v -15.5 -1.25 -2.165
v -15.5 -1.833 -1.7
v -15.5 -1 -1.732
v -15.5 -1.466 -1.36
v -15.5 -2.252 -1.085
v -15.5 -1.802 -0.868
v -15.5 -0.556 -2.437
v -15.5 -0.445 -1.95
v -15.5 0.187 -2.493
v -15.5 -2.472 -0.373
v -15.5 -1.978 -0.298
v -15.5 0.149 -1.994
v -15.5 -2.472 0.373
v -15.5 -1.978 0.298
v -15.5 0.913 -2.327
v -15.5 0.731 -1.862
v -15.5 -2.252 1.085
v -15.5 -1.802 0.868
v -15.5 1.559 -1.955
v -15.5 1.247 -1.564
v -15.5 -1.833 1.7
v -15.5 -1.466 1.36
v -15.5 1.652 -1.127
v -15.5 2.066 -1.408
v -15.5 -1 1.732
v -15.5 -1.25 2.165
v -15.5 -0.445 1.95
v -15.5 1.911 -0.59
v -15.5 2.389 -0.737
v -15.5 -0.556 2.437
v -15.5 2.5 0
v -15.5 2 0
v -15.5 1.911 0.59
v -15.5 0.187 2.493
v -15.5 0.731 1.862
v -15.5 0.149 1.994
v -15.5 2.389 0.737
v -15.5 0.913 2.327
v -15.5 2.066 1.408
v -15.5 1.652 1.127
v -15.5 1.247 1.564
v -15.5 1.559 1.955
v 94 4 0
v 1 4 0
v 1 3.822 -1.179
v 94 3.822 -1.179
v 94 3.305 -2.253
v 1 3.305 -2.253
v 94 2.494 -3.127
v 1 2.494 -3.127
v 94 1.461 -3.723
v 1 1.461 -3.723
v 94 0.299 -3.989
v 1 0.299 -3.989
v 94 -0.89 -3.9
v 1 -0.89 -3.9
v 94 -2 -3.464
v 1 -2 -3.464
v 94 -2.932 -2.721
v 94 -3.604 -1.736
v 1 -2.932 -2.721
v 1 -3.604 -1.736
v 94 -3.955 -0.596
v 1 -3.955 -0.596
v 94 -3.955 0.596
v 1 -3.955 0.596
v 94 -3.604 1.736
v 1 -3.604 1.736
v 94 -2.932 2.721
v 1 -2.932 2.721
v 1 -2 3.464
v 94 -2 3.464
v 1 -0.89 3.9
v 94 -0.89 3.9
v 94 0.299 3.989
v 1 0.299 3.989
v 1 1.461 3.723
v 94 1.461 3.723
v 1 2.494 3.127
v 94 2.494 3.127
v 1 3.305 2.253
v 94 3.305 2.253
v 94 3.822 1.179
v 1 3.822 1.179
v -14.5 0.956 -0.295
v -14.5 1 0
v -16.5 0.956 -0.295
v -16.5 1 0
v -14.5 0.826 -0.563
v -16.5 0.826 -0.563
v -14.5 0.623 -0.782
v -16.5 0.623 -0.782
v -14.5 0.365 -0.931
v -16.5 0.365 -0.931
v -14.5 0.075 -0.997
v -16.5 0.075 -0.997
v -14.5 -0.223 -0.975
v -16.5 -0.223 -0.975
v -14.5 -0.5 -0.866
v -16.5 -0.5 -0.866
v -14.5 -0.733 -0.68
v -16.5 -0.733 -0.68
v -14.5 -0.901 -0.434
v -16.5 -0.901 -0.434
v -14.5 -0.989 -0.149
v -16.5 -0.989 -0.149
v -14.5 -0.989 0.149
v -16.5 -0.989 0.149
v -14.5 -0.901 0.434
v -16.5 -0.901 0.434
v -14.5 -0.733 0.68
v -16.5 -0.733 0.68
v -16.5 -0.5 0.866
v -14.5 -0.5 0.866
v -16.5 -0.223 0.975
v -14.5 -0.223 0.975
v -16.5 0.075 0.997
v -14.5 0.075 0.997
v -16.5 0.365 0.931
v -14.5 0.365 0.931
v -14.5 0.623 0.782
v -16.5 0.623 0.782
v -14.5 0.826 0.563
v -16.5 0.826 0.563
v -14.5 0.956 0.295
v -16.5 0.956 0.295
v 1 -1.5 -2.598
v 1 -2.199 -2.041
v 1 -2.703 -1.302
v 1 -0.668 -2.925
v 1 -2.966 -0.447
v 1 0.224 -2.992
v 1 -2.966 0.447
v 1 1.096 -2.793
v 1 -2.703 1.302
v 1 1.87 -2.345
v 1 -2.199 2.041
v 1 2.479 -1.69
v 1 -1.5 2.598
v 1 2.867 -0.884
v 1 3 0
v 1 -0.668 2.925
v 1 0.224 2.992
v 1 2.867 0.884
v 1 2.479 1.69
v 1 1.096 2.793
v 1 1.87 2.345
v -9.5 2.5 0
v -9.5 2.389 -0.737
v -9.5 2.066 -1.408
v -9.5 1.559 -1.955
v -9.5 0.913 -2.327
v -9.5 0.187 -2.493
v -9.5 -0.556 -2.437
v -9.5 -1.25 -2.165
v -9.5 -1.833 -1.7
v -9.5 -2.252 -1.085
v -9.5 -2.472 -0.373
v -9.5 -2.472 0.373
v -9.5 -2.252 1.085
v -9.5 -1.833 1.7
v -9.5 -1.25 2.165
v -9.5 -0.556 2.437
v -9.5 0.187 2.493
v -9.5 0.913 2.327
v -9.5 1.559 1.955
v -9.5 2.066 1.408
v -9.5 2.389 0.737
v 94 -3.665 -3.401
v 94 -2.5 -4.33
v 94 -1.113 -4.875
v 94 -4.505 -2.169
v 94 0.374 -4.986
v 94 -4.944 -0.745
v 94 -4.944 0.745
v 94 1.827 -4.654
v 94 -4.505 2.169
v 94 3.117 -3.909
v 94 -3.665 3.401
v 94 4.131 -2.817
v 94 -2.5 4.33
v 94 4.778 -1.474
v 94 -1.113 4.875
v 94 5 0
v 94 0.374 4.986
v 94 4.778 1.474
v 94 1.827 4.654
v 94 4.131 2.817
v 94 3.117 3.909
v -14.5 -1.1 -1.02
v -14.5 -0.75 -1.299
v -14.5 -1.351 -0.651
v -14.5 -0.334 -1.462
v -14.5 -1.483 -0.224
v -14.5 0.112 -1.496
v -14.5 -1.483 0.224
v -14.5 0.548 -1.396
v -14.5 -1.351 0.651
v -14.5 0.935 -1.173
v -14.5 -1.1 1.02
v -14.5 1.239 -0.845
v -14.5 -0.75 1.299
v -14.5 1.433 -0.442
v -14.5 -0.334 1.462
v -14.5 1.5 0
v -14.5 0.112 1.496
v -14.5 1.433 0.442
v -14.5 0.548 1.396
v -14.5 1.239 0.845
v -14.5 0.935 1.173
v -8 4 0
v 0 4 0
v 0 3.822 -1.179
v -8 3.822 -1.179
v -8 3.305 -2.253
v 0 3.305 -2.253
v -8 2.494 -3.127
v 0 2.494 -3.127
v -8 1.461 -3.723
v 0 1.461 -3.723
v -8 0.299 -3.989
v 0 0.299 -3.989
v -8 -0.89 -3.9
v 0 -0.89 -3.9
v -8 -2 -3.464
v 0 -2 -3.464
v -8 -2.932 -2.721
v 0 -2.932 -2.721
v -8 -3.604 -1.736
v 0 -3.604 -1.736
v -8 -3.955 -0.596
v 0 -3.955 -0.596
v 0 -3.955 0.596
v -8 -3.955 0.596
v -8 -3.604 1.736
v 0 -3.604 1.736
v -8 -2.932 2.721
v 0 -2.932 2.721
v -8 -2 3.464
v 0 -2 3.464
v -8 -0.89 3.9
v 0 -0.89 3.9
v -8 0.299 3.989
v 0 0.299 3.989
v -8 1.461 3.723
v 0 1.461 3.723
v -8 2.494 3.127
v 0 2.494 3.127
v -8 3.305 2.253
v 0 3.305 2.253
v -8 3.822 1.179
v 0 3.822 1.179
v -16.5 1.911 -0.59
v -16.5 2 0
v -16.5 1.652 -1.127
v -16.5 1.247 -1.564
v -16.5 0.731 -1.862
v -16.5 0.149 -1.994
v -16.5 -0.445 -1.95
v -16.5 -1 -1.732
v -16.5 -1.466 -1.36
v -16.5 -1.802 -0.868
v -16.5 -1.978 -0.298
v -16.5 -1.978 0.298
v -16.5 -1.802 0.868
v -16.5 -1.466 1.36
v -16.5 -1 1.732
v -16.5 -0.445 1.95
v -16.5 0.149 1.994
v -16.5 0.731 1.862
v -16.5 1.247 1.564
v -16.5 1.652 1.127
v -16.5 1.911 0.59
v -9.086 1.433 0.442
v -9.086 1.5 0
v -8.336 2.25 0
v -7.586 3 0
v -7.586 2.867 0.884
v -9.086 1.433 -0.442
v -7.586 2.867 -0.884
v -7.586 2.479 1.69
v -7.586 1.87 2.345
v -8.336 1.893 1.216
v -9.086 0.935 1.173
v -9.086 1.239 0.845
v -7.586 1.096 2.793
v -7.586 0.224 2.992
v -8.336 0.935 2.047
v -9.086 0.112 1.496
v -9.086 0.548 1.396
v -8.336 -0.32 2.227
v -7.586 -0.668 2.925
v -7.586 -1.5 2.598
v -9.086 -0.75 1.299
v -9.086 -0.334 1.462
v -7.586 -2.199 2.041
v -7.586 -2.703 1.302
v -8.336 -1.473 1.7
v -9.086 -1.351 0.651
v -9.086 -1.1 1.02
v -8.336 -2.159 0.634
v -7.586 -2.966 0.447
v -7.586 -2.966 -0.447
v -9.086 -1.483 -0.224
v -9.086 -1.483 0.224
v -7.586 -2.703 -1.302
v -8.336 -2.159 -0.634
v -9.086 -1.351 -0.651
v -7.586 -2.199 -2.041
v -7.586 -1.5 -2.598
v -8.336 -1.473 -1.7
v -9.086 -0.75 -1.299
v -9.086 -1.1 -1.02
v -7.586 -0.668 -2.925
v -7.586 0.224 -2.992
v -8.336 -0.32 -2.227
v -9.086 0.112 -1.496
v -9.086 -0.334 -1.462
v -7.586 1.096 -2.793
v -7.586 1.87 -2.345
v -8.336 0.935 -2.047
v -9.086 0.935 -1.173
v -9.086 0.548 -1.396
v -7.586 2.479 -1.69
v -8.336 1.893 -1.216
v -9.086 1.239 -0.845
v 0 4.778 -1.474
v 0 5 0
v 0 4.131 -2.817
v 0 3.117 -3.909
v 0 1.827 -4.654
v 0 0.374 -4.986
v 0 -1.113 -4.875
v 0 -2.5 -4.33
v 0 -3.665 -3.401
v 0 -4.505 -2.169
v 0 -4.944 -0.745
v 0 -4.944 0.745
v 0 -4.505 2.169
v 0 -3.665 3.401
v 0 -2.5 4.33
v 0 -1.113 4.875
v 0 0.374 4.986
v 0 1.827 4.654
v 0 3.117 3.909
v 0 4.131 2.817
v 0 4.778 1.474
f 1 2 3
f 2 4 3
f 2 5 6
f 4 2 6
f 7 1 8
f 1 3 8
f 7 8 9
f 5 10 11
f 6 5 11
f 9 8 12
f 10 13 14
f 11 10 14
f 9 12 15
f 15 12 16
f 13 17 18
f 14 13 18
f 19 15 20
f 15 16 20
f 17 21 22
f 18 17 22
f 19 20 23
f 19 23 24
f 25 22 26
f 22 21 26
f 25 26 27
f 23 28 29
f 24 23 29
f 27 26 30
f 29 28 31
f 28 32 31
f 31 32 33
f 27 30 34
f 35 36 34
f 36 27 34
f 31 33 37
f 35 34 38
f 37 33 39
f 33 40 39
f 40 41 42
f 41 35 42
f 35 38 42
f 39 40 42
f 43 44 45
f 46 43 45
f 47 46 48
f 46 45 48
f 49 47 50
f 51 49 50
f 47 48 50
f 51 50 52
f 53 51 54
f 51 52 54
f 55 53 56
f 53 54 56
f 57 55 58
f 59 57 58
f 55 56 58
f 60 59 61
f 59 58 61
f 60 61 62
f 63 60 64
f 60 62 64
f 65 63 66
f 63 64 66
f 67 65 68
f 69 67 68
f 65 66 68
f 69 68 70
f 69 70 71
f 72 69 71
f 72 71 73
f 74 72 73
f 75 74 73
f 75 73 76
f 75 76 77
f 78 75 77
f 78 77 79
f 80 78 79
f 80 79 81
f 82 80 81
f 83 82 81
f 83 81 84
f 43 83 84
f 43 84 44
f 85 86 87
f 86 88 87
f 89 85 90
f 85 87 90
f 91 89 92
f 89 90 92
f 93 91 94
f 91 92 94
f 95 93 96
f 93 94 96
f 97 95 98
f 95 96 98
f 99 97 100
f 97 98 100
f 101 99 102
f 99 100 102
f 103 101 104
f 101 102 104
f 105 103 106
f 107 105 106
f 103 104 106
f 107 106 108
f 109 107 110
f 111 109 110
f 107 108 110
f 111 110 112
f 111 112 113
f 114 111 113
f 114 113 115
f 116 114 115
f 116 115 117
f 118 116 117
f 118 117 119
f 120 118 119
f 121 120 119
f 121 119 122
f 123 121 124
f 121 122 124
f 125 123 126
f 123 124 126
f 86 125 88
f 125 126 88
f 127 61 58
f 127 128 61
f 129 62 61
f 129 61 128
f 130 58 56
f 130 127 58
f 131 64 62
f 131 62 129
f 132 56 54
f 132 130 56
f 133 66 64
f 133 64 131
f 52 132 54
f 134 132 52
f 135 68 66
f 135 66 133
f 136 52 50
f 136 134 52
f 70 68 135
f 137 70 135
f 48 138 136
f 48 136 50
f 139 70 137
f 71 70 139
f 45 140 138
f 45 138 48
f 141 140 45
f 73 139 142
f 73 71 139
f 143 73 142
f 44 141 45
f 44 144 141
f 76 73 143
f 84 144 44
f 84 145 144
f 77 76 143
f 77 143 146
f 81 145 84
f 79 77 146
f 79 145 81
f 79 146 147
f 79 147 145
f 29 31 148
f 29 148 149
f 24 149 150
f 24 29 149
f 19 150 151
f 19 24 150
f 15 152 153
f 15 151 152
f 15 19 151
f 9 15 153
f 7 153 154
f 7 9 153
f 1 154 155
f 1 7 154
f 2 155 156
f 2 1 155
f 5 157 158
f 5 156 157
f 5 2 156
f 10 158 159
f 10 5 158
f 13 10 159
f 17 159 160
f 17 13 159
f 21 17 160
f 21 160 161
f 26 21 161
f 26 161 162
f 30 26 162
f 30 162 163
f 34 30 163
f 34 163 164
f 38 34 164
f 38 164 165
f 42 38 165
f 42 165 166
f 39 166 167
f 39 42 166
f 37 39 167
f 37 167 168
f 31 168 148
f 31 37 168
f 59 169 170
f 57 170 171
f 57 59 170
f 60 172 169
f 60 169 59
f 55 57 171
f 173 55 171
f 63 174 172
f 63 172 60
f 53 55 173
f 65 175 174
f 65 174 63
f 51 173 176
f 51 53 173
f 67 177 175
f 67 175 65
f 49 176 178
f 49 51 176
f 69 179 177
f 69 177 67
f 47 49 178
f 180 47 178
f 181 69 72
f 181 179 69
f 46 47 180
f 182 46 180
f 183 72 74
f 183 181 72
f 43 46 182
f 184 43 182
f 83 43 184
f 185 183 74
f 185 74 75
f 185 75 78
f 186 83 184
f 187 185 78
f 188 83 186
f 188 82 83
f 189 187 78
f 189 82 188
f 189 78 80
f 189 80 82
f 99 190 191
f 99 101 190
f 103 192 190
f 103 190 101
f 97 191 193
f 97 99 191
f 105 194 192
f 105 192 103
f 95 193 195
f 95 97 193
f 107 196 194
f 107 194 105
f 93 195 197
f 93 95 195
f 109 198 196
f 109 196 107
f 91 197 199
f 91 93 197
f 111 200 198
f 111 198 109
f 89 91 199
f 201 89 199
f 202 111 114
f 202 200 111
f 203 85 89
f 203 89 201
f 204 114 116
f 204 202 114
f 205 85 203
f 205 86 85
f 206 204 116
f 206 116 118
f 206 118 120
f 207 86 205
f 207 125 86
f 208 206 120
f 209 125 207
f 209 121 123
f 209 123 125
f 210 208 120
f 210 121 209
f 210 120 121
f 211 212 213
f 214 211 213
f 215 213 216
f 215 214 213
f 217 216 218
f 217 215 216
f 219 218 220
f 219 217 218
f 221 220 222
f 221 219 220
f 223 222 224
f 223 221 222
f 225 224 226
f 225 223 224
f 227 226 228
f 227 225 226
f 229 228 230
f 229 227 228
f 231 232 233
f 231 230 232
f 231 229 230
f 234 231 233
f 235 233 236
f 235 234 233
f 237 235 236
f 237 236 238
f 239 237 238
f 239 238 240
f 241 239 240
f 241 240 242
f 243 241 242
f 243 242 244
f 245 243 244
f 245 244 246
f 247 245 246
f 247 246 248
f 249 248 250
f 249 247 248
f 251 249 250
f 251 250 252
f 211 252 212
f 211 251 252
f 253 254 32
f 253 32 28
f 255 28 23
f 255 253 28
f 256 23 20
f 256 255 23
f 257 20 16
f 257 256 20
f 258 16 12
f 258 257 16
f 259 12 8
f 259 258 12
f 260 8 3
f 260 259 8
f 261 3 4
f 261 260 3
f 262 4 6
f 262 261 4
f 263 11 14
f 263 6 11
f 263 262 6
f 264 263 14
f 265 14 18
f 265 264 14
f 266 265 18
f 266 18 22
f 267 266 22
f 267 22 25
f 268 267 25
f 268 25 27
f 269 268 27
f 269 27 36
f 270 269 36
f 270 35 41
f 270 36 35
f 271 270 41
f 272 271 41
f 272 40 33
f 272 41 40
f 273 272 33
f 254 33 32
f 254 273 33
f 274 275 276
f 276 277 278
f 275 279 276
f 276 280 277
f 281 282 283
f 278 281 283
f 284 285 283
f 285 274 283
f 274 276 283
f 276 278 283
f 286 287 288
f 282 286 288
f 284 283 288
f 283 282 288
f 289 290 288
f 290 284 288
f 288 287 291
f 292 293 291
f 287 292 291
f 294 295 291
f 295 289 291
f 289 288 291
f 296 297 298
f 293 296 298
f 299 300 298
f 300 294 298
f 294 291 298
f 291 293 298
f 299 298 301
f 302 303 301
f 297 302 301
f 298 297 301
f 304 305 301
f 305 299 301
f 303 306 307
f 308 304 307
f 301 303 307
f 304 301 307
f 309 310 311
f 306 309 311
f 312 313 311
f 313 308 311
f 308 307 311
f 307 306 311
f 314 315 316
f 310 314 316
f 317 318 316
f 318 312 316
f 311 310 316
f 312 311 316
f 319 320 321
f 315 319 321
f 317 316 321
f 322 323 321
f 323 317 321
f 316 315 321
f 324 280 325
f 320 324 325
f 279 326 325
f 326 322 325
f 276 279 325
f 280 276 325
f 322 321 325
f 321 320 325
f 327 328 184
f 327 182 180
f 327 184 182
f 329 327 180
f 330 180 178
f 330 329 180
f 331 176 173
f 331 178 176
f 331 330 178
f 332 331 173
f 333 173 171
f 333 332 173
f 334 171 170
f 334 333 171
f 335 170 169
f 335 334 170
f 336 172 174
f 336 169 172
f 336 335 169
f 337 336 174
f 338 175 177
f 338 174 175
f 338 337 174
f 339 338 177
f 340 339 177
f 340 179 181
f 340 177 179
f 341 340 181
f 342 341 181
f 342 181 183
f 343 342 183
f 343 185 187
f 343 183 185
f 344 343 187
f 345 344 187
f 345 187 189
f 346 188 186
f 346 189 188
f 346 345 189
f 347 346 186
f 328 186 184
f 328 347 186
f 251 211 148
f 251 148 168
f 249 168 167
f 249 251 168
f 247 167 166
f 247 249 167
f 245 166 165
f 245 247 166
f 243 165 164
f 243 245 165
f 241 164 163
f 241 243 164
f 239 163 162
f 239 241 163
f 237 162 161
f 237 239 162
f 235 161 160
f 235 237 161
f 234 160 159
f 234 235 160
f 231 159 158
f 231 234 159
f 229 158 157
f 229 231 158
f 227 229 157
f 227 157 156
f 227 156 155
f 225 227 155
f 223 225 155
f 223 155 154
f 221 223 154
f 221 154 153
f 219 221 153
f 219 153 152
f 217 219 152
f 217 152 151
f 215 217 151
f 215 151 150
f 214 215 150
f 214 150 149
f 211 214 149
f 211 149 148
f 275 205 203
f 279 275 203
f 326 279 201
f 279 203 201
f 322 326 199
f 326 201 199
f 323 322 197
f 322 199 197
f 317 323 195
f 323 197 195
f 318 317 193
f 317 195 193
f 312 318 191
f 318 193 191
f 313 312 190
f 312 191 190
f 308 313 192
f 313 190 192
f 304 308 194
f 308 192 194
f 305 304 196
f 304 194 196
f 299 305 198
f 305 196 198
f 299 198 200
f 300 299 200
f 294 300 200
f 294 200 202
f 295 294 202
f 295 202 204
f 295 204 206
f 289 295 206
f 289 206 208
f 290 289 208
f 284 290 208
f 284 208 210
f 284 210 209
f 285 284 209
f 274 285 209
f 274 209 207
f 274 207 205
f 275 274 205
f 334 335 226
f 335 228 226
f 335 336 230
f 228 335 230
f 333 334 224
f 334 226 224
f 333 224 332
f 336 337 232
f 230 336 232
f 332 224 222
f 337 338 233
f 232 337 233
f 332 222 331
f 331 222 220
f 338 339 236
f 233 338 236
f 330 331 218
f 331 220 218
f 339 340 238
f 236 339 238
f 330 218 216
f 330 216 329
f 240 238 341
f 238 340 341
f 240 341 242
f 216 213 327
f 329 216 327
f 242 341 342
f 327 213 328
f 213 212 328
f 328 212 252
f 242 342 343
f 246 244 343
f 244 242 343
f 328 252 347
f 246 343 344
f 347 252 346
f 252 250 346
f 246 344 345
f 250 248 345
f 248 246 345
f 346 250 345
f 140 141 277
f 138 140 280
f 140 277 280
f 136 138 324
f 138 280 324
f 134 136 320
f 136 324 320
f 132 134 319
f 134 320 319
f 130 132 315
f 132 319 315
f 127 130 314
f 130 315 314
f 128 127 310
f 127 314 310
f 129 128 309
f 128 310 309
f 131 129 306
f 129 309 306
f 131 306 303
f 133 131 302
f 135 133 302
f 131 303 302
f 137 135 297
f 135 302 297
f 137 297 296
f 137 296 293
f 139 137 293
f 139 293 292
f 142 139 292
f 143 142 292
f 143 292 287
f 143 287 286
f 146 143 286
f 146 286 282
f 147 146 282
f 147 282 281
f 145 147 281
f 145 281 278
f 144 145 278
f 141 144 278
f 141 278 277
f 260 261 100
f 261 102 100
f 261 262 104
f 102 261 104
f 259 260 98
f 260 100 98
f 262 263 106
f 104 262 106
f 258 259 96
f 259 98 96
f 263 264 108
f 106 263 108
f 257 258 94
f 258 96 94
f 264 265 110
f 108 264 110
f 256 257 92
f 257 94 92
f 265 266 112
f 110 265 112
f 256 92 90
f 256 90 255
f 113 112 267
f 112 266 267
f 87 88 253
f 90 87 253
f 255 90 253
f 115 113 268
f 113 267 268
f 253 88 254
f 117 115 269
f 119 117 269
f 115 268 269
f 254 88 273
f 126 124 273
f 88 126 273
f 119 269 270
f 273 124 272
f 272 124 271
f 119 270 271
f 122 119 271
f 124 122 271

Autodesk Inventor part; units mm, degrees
ref_plane "YZ Plane" through (0, 0, 0) normal (1, 0, 0) x (0, 1, 0)
ref_plane "XZ Plane" through (0, 0, 0) normal (0, 1, 0) x (-1, 0, 0)
ref_plane "XY Plane" through (0, 0, 0) normal (0, 0, 1) x (1, 0, 0)
sketch "草图1" plane through (0, 0, 0) normal (1, 0, 0) x (0, 1, 0)
  circle A0 centre (0, 0) radius 5
  dimension "d0" = 10
extrude "body" add sketch "草图1" along normal blind 94
sketch "草图2" plane through (0, 0, 0) normal (0, 0, 1) x (1, 0, 0)
  line L0 (0, 0) -> (0, 4)
  line L1 (0, 5) -> (0, -5) projected
  line L2 (0, 4) -> (-2, 4)
  line L3 (-2, 4) -> (-4, 4)
  line L4 (-4, 4) -> (-8, 4)
  line L5 (-8, 4) -> (-9.5, 2.5)
  line L6 (-9.5, 2.5) -> (-15.5, 2.5)
  line L7 (-15.5, 2.5) -> (-15.5, 2)
  line L8 (-15.5, 2) -> (-16.5, 2)
  line L9 (-16.5, 2) -> (-16.5, 0)
  line L10 (-18.0565, 0) -> (1.4122, 0)
  line L11 (-16.5, 0) -> (0, 0)
  dimension "d3" = 4
  dimension "d4" = 2
  dimension "d5" = 2
  dimension "d6" = 4
  dimension "d9" = 1.5
  dimension "d10" = 1.5
  dimension "d11" = 6
  dimension "d12" = 0.5
  dimension "d13" = 1
revolve "旋转1" add sketch "草图2" angle 360 about axis through (-18.0565, 0, 0) along (1, 0, 0)
shell "抽壳1" thickness 1 removed faces 2 at (94, -0.591, 1.5584) at (-16.5, 0.343, 0.4805)
properties part number "pen"
